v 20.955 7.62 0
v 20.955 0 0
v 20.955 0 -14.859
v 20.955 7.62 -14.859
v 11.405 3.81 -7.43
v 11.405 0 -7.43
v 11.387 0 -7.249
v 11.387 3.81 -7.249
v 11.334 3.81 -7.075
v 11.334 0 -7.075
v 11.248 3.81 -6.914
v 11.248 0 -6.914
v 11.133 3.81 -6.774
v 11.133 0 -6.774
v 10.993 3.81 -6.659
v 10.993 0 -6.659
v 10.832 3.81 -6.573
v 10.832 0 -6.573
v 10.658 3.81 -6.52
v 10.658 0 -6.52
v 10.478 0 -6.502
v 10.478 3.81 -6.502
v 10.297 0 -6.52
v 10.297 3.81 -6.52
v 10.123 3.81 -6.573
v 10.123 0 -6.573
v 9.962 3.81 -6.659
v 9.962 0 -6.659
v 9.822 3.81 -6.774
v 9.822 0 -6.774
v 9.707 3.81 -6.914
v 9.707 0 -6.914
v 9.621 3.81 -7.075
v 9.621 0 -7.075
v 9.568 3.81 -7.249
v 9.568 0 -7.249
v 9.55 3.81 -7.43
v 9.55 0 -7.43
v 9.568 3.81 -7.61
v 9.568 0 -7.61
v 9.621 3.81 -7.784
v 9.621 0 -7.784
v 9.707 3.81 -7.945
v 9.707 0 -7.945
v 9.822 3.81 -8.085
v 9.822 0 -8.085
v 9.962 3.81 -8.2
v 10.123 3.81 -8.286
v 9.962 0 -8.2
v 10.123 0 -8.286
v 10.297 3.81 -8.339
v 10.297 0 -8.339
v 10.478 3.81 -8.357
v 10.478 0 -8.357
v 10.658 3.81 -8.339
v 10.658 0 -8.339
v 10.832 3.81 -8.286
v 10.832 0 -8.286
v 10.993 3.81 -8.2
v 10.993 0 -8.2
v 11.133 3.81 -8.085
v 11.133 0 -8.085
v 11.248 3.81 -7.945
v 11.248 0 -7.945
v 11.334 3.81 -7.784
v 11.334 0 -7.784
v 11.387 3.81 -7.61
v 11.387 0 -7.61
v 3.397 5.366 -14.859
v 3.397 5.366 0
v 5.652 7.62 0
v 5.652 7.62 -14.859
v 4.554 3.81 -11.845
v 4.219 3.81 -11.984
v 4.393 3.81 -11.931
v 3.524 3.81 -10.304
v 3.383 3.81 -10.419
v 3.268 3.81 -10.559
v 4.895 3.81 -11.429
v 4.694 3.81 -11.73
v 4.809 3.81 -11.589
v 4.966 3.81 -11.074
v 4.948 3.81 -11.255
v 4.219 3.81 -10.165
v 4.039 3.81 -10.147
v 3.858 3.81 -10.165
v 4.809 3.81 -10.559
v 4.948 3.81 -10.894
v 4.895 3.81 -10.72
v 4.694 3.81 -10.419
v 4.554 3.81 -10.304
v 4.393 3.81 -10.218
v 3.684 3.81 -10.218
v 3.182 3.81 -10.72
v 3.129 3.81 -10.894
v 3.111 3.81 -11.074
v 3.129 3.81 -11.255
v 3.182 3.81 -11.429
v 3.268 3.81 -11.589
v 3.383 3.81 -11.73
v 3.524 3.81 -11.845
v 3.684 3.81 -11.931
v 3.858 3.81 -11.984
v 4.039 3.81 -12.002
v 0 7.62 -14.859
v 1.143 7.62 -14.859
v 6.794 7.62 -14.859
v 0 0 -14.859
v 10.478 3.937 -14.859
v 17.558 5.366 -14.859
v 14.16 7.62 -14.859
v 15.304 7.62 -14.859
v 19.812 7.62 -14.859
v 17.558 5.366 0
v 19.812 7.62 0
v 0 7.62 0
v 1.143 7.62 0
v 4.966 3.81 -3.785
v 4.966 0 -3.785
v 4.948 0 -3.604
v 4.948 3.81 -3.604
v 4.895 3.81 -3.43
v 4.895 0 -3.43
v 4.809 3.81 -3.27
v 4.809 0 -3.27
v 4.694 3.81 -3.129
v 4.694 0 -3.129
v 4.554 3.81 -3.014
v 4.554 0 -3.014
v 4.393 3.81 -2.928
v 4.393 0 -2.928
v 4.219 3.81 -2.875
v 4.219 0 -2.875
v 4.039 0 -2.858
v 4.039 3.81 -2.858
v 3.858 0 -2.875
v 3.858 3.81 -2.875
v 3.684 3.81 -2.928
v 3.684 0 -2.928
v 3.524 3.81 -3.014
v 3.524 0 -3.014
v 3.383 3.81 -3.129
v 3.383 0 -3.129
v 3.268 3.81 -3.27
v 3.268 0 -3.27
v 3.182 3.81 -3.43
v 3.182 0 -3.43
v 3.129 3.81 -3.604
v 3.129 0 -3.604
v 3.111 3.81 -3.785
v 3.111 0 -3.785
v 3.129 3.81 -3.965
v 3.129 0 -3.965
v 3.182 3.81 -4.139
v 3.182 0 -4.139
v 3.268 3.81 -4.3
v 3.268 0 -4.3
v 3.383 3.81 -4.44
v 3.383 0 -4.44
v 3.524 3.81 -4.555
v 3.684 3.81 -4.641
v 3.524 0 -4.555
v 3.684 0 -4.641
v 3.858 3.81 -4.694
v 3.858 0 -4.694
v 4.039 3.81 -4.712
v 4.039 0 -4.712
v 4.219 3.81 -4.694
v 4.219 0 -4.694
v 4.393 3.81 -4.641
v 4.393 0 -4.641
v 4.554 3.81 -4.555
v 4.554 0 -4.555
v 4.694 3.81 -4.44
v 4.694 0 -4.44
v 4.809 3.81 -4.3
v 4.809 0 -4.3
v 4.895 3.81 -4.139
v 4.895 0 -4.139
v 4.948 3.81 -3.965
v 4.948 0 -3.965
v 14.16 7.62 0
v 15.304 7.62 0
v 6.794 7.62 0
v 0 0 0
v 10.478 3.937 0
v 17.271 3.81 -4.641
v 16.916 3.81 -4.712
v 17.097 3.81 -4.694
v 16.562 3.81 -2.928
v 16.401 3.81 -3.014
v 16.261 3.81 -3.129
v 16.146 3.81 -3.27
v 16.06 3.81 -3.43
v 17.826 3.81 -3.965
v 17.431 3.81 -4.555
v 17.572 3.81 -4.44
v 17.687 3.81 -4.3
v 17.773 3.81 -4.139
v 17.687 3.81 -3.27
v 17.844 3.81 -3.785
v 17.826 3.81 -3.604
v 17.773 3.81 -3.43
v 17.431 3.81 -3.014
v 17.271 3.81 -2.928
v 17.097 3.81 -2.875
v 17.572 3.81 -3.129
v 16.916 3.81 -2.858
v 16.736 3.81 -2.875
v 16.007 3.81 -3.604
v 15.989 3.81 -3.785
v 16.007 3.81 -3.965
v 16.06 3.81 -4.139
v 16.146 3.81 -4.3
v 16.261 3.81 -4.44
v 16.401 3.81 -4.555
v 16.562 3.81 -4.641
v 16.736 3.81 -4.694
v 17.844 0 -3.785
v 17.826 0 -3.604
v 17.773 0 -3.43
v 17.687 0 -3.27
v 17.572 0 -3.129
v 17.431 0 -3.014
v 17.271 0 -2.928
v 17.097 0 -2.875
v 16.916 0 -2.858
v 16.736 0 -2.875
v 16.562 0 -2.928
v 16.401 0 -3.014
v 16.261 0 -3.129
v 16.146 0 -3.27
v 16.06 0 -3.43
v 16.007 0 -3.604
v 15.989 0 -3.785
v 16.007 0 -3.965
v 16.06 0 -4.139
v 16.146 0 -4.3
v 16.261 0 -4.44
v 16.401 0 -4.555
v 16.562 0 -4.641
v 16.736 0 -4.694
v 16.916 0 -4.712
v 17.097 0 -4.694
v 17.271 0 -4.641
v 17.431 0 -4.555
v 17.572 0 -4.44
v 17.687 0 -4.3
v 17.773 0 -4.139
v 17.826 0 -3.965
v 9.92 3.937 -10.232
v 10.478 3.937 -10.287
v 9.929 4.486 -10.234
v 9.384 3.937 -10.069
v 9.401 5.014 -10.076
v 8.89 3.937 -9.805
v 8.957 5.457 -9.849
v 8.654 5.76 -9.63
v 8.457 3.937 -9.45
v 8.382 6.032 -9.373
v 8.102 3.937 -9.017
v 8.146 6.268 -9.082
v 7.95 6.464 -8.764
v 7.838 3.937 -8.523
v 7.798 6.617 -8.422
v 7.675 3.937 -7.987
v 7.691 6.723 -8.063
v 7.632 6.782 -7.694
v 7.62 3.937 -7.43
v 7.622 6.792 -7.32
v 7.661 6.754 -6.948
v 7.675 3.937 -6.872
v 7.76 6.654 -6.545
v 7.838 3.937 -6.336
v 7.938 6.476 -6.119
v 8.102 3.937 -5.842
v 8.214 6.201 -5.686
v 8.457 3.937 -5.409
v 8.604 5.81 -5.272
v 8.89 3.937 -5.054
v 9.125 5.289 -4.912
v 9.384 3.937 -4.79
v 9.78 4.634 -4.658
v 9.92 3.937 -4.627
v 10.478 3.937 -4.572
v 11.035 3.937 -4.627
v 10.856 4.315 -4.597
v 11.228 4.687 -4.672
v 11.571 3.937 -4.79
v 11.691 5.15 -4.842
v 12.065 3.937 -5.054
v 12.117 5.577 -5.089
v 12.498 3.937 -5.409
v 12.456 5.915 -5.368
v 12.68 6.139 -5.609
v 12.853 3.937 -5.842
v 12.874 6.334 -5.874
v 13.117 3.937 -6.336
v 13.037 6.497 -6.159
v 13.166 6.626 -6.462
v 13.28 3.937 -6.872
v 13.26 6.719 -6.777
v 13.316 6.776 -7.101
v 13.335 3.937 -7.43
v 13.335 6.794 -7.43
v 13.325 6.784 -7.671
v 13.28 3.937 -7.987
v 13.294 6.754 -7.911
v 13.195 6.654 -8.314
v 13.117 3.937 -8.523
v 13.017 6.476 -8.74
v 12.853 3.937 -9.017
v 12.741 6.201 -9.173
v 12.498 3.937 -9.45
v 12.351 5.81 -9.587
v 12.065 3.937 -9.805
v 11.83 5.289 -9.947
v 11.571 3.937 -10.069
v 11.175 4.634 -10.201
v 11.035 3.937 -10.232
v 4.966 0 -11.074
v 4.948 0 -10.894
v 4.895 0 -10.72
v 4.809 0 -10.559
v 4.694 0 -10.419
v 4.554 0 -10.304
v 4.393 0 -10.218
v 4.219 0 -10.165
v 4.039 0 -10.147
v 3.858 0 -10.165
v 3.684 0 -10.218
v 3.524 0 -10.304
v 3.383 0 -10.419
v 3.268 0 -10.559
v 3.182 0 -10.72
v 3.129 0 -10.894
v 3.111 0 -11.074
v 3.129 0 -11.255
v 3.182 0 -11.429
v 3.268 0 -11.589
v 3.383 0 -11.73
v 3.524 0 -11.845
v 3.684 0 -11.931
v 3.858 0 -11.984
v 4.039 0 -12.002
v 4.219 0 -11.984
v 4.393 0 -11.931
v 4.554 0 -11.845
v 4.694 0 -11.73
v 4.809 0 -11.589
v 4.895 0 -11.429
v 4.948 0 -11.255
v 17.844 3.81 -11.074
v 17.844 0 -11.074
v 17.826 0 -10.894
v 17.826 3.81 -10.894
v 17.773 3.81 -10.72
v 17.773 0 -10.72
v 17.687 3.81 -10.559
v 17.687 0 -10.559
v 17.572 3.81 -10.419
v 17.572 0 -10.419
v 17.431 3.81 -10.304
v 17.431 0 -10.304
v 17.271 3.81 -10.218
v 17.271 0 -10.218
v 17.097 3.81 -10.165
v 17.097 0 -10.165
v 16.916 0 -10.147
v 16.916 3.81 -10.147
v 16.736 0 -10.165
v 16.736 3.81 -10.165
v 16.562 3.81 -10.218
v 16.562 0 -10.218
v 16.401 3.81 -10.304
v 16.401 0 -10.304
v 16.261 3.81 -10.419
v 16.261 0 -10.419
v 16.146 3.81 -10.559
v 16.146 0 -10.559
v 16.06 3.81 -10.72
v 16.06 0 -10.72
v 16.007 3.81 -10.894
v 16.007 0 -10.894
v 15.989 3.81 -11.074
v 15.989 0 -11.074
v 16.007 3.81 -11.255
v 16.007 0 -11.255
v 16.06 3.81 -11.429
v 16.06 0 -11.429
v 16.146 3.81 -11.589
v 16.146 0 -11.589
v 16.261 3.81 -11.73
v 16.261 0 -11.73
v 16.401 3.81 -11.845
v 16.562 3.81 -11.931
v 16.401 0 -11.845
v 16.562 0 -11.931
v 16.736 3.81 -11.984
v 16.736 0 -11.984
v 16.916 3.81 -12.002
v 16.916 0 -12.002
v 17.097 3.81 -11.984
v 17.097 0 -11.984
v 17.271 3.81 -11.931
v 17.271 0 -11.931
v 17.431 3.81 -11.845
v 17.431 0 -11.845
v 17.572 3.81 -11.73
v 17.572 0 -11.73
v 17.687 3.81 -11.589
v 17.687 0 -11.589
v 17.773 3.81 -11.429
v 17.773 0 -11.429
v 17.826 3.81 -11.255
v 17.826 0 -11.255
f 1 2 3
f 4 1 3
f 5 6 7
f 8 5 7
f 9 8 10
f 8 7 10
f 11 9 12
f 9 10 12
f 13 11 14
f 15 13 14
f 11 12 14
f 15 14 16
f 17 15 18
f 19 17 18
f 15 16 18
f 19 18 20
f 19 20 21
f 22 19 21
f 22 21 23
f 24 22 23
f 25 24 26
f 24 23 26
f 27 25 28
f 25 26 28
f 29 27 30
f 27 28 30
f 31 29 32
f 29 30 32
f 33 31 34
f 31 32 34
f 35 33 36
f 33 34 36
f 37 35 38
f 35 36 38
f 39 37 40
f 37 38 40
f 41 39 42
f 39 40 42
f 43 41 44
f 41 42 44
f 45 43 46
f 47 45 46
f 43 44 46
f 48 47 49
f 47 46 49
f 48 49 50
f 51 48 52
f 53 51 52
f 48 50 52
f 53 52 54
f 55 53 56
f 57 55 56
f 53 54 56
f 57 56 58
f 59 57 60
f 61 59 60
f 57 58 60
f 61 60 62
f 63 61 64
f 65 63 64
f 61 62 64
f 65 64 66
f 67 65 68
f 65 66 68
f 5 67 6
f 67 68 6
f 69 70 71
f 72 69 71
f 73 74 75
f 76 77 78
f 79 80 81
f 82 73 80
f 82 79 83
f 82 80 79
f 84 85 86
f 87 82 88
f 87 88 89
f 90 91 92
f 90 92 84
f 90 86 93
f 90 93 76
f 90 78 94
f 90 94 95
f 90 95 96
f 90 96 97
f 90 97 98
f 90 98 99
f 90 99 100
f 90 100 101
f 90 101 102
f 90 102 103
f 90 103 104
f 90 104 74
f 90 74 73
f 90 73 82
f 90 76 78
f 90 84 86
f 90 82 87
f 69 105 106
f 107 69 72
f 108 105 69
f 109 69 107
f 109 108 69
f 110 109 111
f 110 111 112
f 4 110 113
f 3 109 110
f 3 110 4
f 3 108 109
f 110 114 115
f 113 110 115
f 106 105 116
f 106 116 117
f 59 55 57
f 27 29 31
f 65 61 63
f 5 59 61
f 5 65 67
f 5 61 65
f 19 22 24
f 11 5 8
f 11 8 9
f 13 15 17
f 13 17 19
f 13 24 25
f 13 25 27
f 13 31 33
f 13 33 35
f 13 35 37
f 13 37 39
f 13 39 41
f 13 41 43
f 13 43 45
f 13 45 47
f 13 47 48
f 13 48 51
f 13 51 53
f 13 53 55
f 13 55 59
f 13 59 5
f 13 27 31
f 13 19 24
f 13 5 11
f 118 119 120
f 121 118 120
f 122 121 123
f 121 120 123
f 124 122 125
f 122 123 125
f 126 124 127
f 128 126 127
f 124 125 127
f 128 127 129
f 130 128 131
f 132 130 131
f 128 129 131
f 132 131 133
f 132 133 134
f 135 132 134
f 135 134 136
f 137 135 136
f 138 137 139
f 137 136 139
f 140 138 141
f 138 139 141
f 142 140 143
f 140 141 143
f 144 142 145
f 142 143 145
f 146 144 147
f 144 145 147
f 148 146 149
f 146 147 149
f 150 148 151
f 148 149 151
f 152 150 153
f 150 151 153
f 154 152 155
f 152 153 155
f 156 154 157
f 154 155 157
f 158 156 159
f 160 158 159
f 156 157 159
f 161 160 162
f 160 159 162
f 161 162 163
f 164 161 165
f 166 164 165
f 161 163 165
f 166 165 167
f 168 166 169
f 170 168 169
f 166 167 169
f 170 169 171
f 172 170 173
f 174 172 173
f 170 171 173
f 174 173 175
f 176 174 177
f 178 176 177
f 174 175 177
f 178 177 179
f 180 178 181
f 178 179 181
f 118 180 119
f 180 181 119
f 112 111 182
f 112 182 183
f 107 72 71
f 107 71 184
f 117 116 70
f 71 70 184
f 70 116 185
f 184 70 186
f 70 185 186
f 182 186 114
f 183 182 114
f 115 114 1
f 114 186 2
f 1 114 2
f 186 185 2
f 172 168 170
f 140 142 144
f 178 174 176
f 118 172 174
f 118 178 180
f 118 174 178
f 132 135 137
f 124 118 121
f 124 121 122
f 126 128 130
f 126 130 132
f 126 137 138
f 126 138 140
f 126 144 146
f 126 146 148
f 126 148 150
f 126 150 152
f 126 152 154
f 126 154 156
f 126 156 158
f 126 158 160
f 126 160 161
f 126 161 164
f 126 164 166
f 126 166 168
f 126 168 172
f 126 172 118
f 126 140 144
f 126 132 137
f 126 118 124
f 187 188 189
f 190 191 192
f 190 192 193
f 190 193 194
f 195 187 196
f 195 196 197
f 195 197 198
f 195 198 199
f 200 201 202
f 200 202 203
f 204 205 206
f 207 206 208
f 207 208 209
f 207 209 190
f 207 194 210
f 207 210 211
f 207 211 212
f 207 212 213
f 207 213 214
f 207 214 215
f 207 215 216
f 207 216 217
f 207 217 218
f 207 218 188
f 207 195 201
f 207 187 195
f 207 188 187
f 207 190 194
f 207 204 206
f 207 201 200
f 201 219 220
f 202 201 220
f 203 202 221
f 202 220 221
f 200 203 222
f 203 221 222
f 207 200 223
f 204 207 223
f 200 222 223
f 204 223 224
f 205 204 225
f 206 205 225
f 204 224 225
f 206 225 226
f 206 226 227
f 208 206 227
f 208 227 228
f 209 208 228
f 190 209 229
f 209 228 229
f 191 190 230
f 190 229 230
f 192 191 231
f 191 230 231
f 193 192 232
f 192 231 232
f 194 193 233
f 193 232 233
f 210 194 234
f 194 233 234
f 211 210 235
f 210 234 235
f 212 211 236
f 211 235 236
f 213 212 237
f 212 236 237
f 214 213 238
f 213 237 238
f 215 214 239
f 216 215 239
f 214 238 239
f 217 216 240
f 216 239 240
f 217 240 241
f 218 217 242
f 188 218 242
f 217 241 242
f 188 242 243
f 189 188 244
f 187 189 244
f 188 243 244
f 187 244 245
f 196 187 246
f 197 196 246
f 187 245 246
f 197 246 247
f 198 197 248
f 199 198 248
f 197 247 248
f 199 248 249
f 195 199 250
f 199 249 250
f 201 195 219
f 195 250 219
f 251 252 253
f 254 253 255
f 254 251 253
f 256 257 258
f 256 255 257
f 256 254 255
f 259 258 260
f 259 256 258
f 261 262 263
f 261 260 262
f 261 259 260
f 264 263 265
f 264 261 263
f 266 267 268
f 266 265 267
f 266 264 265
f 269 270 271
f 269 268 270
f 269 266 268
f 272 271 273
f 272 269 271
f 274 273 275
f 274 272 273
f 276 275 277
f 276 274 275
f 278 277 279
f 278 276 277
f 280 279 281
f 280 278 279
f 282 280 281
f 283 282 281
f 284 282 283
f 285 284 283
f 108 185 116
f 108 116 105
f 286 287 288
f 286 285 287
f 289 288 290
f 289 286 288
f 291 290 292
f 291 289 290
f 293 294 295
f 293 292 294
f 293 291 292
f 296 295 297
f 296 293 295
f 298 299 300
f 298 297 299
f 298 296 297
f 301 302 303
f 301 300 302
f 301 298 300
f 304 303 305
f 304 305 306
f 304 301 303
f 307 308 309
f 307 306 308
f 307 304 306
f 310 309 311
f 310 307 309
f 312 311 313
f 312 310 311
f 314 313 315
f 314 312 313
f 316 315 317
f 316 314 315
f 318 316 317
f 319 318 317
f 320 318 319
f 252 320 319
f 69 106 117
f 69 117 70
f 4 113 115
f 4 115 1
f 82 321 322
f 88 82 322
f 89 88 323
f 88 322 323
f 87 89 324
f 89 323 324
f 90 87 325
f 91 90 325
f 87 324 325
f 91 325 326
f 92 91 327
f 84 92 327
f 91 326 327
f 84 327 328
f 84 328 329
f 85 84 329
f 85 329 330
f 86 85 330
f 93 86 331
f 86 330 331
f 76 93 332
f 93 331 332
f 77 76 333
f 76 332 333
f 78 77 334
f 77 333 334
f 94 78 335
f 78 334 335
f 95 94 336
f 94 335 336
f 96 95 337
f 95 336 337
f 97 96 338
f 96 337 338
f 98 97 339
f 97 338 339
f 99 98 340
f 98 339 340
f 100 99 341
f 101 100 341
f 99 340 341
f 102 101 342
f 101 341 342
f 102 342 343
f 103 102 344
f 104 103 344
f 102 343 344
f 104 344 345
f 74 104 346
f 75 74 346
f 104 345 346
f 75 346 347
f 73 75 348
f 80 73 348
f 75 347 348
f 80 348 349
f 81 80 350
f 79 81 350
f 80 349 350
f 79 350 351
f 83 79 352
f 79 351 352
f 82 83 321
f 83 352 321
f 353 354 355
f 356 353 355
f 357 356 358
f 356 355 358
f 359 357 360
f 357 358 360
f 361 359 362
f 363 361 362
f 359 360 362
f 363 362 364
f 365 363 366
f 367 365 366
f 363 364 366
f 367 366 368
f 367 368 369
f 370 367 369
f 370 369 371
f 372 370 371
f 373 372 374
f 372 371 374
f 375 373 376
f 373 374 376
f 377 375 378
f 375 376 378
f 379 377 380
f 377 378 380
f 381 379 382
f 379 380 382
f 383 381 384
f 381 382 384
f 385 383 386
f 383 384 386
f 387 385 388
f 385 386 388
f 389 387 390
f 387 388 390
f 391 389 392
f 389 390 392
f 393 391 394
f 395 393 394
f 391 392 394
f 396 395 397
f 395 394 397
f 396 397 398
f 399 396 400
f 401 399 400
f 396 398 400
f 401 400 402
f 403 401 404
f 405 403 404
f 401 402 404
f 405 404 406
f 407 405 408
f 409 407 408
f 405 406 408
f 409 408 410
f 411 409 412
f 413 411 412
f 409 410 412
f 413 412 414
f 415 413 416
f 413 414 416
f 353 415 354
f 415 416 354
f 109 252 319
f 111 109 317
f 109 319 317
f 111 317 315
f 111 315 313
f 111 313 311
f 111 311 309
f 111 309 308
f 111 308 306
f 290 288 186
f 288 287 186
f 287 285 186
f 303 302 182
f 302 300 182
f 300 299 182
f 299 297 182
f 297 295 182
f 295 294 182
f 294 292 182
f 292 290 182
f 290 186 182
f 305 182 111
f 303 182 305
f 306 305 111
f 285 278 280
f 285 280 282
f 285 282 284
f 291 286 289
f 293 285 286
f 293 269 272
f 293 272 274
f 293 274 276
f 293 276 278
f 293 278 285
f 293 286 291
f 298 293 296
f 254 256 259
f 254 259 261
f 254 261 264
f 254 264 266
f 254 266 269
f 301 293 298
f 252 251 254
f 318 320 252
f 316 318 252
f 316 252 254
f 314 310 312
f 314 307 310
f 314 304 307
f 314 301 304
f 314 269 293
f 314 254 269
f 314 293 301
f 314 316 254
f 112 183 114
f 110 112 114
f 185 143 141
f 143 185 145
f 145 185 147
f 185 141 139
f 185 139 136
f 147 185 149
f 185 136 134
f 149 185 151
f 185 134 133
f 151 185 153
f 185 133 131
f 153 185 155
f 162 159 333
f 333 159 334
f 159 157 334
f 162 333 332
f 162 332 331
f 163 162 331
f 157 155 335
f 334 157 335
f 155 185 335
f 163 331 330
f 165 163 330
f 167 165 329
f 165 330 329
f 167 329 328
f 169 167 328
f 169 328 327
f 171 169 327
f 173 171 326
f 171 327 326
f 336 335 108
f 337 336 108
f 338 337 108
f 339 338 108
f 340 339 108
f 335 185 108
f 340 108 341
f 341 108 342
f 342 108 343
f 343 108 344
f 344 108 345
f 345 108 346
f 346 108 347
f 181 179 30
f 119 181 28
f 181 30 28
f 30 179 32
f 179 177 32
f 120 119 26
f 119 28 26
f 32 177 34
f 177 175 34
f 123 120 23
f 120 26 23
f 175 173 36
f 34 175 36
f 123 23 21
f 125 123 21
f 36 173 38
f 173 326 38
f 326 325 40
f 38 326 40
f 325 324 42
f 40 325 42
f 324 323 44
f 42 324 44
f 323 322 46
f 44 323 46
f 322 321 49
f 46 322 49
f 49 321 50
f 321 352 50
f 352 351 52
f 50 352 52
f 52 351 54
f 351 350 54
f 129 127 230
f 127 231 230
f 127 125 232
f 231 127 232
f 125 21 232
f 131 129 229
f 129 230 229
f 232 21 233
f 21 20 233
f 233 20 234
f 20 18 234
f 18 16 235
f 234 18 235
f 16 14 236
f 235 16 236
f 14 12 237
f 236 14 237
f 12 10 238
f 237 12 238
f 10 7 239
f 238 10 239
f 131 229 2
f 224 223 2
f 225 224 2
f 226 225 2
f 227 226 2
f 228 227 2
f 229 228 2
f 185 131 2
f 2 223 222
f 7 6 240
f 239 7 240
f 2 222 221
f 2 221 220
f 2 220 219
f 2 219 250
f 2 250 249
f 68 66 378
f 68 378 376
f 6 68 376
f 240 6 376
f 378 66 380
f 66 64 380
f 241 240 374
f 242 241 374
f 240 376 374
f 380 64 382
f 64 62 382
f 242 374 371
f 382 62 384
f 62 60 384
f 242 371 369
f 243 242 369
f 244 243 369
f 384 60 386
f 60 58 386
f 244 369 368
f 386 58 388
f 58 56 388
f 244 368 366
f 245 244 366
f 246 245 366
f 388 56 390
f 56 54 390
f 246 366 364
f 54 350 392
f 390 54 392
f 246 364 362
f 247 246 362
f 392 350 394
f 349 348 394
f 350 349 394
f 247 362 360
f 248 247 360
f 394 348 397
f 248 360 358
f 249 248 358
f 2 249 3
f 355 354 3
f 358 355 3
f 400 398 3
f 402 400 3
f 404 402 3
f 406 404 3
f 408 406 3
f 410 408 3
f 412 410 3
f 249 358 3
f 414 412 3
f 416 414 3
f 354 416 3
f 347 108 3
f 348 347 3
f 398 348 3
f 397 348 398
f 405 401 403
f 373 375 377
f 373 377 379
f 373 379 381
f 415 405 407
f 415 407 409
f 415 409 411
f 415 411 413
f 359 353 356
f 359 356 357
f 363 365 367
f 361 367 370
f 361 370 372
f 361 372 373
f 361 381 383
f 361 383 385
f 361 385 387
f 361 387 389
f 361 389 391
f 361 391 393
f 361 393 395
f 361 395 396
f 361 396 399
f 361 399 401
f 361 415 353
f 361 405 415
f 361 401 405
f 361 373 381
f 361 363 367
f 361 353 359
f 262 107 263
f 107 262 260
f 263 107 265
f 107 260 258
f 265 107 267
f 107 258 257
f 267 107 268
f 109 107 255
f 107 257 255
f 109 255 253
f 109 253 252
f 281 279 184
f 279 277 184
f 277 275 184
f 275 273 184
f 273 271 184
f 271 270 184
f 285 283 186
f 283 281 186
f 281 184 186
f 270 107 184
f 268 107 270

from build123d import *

# Parameters (mm, degrees)
SKETCH1_W           = 20.955
SKETCH1_H           = 14.859
BOSS_EXTRUDE1_DEPTH = 7.62
CUT_EXTRUDE1_DEPTH  = 15.859
SKETCH3_R           = 2.8575
CUT_EXTRUDE2_DEPTH  = 4.683
SKETCH4_R           = 0.9271
CUT_EXTRUDE3_DEPTH  = 3.81


with BuildPart() as part:
    # Sketch1 → Boss-Extrude1 (new body)
    with BuildSketch(Plane(origin=(0, 0, 0), x_dir=(1, 0, 0), z_dir=(0, 1, 0))):
        with Locations((10.4775, 7.4295)):
            Rectangle(SKETCH1_W, SKETCH1_H)
    extrude(amount=BOSS_EXTRUDE1_DEPTH)

    # Sketch2 → Cut-Extrude1 (cut, through all)
    with BuildSketch(Plane.XY):
        Polygon((5.6515, 7.62), (1.143, 7.62), (3.39725, 5.36575), align=None)
        Polygon((14.1605, 7.62), (6.7945, 7.62), (10.4775, 3.937), align=None)
        Polygon((19.812, 7.62), (15.3035, 7.62), (17.55775, 5.36575), align=None)
    extrude(amount=-CUT_EXTRUDE1_DEPTH, mode=Mode.SUBTRACT)

    # Sketch3 → Cut-Extrude2 (cut, through all)
    with BuildSketch(Plane(origin=(0, 3.937, 0), x_dir=(1, 0, 0), z_dir=(0, 1, 0))):
        with Locations((10.4775, 7.4295)):
            Circle(SKETCH3_R)
    extrude(amount=CUT_EXTRUDE2_DEPTH, mode=Mode.SUBTRACT)

    # Sketch4 → Cut-Extrude3 (cut)
    with BuildSketch(Plane.XZ):
        with Locations((4.0386, -3.7846)):
            Circle(SKETCH4_R)
        with Locations((4.0386, -11.0744)):
            Circle(SKETCH4_R)
        with Locations((10.4775, -7.4295)):
            Circle(SKETCH4_R)
        with Locations((16.9164, -11.0744)):
            Circle(SKETCH4_R)
        with Locations((16.9164, -3.7846)):
            Circle(SKETCH4_R)
    extrude(amount=-CUT_EXTRUDE3_DEPTH, mode=Mode.SUBTRACT)


solid = part.part
